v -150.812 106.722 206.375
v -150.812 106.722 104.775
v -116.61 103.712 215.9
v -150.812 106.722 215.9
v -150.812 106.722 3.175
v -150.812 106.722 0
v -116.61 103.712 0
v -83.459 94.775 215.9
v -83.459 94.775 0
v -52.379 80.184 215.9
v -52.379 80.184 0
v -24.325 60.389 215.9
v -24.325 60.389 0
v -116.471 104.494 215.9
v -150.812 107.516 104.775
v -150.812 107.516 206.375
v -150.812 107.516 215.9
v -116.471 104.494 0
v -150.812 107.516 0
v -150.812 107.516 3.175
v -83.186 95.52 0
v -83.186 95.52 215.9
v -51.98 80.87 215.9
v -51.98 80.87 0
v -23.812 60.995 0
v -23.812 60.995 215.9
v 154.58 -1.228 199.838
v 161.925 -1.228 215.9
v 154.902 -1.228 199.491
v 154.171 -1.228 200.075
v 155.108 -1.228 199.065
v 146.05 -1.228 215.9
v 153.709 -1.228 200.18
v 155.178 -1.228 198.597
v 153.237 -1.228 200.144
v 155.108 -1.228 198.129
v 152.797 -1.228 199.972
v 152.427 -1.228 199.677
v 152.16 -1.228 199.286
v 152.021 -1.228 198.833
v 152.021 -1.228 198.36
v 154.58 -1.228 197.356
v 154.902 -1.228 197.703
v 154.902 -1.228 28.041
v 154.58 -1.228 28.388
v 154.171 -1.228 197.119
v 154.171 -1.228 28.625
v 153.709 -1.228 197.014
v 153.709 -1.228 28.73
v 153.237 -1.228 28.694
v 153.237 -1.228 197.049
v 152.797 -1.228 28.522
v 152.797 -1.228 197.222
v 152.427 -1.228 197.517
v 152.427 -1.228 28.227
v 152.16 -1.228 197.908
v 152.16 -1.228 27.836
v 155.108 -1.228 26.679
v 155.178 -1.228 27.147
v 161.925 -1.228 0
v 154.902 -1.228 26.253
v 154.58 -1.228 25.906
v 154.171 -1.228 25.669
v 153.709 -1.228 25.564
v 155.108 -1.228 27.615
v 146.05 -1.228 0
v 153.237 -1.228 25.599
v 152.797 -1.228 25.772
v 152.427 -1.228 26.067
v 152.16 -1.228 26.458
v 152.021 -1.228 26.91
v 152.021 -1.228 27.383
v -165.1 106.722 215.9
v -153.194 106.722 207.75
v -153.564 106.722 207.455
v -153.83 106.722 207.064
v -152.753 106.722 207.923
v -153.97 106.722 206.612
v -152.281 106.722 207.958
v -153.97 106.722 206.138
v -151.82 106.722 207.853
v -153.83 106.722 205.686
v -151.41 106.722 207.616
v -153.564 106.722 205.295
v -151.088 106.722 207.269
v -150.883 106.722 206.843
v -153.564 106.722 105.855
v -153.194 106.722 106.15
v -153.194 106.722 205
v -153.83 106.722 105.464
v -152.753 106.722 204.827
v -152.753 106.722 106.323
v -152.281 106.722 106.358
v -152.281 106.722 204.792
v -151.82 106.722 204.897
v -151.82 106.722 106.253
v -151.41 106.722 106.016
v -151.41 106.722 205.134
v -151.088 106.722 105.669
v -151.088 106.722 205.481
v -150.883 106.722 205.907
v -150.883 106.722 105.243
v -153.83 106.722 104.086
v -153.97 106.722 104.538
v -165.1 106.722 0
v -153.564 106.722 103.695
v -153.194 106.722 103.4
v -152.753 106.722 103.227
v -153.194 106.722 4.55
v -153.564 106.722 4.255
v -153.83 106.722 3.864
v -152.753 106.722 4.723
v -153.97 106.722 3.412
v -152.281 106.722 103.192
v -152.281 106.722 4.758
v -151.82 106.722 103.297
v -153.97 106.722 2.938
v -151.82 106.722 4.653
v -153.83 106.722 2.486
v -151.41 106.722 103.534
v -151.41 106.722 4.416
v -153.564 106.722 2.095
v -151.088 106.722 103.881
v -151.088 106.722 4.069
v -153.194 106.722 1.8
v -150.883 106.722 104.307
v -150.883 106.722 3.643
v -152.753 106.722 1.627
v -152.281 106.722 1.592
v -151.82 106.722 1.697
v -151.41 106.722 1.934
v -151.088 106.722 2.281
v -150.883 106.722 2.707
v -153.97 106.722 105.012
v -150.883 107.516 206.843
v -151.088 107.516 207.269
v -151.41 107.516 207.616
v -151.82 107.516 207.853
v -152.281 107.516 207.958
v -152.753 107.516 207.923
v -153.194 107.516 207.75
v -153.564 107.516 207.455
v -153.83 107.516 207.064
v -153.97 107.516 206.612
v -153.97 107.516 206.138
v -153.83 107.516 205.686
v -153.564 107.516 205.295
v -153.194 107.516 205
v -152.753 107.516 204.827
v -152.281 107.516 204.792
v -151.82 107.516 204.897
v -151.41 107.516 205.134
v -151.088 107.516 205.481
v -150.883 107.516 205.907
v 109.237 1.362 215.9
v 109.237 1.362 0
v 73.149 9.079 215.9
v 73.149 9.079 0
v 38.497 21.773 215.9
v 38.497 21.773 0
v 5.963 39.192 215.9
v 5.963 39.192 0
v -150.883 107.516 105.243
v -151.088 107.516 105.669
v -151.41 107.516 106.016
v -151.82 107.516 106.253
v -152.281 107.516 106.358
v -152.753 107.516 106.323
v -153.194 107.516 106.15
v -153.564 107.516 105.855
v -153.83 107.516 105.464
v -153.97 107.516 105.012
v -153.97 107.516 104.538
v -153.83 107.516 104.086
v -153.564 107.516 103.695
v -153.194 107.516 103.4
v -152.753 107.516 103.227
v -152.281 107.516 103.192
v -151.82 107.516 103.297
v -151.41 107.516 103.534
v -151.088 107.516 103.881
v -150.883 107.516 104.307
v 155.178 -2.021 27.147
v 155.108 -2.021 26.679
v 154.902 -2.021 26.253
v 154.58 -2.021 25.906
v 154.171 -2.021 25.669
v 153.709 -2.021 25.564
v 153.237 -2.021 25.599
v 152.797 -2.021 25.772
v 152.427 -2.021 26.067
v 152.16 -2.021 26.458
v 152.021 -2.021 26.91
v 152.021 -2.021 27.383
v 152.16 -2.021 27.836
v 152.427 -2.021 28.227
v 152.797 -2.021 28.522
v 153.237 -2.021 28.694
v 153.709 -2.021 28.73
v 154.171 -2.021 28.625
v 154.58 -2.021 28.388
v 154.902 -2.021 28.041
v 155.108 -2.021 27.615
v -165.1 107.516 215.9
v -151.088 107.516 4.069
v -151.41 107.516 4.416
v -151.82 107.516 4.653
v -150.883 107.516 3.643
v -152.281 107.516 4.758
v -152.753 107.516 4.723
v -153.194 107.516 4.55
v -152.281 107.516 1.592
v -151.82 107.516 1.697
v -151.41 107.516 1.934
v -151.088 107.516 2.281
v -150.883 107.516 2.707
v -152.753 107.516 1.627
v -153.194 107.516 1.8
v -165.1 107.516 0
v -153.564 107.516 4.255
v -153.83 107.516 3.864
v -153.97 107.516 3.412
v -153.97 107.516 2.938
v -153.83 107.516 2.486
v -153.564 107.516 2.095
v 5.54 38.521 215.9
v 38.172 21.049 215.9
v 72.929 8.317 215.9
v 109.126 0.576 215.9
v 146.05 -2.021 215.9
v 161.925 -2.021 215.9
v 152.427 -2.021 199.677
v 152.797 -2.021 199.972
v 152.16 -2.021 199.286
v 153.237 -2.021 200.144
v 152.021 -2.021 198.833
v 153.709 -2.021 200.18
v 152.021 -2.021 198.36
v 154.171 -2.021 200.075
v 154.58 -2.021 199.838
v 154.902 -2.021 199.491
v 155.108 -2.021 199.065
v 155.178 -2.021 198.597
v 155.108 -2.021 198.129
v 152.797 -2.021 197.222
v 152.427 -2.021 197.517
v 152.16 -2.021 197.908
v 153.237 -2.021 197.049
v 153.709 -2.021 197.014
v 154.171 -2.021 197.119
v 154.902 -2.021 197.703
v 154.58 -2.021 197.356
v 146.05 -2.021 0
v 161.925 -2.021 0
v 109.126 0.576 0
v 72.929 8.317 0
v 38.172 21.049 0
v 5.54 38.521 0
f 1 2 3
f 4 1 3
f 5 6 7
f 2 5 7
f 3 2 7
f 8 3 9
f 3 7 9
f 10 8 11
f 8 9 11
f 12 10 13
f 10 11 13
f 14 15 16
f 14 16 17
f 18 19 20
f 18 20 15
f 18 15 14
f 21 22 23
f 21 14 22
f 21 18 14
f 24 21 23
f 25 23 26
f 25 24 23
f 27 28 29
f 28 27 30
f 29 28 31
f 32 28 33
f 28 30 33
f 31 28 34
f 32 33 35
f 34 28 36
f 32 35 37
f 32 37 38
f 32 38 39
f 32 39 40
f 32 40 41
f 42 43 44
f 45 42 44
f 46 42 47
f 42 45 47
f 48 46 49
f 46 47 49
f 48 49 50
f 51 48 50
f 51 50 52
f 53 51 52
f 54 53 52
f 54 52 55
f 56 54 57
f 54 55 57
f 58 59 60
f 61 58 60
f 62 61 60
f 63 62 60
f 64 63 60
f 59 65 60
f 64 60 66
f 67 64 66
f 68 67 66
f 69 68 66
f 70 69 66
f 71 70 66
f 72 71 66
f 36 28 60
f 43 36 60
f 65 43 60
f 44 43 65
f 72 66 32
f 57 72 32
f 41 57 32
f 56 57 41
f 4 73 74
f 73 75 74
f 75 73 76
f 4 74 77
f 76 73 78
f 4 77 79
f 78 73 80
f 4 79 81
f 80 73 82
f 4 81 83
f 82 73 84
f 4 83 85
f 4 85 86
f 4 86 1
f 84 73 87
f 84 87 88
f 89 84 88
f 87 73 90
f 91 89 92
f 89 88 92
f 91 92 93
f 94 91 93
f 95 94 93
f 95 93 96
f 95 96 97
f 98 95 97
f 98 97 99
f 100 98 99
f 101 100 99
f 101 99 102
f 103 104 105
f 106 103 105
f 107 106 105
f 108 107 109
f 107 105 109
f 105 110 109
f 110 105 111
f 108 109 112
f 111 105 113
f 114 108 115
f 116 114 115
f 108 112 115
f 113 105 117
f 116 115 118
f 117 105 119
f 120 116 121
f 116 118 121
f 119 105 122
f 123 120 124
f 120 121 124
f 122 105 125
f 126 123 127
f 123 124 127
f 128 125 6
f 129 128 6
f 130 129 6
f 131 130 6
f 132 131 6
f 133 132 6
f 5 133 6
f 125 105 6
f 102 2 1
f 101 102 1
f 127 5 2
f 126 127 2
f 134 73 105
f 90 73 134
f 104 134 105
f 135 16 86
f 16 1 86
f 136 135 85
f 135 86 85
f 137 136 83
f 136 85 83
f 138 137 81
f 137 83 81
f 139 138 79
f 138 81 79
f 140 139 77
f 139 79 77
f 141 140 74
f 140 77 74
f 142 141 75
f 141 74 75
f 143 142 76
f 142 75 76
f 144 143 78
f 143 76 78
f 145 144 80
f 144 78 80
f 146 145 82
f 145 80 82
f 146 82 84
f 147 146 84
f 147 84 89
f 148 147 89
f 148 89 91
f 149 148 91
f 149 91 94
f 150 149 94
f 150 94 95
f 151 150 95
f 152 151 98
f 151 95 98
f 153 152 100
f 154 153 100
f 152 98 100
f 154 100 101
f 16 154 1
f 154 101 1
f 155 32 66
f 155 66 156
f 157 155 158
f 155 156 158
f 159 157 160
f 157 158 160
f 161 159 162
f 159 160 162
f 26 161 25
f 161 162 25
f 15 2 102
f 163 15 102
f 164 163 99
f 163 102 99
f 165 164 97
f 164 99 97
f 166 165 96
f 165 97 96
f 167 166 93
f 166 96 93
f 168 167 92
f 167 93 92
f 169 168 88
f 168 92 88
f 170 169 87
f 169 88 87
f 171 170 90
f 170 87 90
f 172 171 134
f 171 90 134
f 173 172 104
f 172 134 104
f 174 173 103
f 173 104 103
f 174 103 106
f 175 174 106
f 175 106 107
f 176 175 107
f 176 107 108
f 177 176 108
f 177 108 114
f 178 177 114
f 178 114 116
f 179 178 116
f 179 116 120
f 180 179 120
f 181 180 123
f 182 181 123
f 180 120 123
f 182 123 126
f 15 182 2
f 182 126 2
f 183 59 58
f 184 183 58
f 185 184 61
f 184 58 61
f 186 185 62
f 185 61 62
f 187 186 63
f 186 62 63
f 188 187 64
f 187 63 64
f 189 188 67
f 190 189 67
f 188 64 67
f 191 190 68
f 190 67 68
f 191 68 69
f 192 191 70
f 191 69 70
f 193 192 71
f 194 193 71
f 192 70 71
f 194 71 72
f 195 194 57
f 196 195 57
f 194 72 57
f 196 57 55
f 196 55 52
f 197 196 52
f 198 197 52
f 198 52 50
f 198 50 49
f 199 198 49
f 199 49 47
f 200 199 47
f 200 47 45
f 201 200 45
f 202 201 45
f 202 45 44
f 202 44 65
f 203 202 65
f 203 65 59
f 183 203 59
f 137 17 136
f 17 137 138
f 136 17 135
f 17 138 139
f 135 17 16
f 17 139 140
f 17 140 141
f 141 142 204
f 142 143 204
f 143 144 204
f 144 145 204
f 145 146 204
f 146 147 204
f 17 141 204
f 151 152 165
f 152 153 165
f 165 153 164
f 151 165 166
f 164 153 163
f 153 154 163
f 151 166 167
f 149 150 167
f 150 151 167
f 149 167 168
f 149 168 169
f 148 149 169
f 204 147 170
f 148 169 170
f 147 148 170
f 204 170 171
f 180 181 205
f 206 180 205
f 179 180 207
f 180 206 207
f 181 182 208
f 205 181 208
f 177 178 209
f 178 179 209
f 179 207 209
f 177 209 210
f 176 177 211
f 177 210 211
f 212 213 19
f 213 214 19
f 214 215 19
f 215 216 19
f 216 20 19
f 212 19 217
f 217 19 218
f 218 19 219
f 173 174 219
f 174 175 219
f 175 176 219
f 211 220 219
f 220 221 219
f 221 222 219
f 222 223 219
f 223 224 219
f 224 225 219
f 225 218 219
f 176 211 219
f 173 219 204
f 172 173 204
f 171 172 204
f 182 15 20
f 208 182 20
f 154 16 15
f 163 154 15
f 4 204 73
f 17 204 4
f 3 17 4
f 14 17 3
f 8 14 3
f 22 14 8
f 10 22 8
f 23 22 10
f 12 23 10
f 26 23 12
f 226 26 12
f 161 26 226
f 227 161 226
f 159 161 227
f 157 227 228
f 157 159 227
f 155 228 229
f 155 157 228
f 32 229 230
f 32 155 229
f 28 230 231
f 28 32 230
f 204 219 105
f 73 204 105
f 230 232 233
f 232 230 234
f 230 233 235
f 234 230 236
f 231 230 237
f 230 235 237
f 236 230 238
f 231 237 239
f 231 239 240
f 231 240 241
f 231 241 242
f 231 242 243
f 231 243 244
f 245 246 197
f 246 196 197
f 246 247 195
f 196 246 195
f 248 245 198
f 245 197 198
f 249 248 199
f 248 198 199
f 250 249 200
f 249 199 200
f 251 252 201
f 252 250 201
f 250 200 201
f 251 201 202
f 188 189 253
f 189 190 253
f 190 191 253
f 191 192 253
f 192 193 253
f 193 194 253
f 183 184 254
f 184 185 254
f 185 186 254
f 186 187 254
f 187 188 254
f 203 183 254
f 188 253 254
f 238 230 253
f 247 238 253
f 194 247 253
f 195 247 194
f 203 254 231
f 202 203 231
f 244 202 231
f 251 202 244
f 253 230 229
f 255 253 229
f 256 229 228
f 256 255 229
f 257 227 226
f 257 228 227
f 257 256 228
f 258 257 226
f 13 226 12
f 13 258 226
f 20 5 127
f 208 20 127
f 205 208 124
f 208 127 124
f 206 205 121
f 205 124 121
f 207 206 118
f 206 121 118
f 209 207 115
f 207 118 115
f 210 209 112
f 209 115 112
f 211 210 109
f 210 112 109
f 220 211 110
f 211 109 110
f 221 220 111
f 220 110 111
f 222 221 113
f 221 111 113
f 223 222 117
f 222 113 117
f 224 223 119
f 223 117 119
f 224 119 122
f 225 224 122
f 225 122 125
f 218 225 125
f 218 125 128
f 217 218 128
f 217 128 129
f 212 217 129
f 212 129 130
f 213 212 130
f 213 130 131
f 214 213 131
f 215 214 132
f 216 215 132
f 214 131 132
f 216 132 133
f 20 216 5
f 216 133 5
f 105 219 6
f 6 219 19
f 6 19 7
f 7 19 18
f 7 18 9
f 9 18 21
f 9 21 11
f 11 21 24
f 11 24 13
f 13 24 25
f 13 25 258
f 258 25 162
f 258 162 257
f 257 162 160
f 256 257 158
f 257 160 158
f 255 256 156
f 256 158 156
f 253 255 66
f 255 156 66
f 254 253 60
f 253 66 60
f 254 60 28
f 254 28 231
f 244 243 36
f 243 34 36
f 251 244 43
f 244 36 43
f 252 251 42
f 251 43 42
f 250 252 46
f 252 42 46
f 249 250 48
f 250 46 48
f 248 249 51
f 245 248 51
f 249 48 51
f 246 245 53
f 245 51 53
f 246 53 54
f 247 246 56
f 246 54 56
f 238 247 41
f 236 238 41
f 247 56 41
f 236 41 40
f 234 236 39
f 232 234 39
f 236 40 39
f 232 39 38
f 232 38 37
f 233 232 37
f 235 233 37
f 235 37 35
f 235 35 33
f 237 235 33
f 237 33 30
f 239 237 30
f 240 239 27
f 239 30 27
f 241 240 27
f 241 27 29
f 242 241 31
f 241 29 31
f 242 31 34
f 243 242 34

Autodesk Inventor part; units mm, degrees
ref_plane "YZ Plane" through (0, 0, 0) normal (1, 0, 0) x (0, 1, 0)
ref_plane "XZ Plane" through (0, 0, 0) normal (0, 1, 0) x (-1, 0, 0)
ref_plane "Work Plane1" through (0, 0, 0) normal (0, 0, 1) x (1, 0, 0)
sketch "Sketch1" plane through (0, 0, 0) normal (0, 0, 1) x (1, 0, 0)
  line L0 (165.1, 107.5162) -> (-165.1, 107.5162) construction
  line L1 (-165.1, 107.5162) -> (-165.1, 110.6912) construction
  line L2 (165.1, 110.6912) -> (-165.1, 110.6912) construction
  line L3 (165.1, 107.5162) -> (165.1, 110.6912) construction
  line L4 (161.925, -1.2275) -> (161.925, 14.6475) construction
  line L5 (161.925, 14.6475) -> (161.1313, 14.6475) construction
  line L6 (161.1313, 14.6475) -> (161.1313, -0.4338) construction
  line L7 (161.1313, -0.4338) -> (146.05, -0.4338) construction
  line L8 (146.05, -0.4338) -> (146.05, -1.2275) construction
  line L9 (146.05, -1.2275) -> (161.925, -1.2275) construction
  line L10 (-153.9875, 110.6912) -> (-150.8125, 110.6912) construction
  line L11 (161.925, -1.2275) -> (146.05, -1.2275)
  arc A0 (-23.8125, 60.9948) -> (-150.8125, 107.5162) centre (-150.8125, -89.0948) ccw
  arc A1 (-23.8125, 60.9948) -> (146.05, -1.2275) centre (146.05, 261.7398) ccw
  line L12 (-150.8125, 110.6912) -> (-150.8125, 107.5162) construction
  line L13 (-150.8125, 107.5162) -> (-165.1, 107.5162)
  arc A2 (-24.3252, 60.3889) -> (-150.8125, 106.7225) centre (-150.8125, -89.0948) ccw
  arc A3 (-24.3252, 60.3889) -> (146.05, -2.0213) centre (146.05, 261.7398) ccw
  line L14 (146.05, -2.0213) -> (161.925, -2.0213)
  line L15 (-165.1, 107.5162) -> (-165.1, 106.7225)
  line L16 (-165.1, 106.7225) -> (-150.8125, 106.7225)
  line L17 (161.925, -1.2275) -> (161.925, -2.0213)
  point P0 (0, 0)
  dimension "d8" = 127
  dimension "d9" = 0.7937
extrude "Extrusion1" add sketch "Sketch1" along normal blind 215.9
sketch "Sketch2" plane through (-165.1, 106.7225, 0) normal (0, -1, 0) x (1, 0, 0)
  circle A0 centre (12.7, 3.175) radius 1.5875
  circle A1 centre (12.7, 104.775) radius 1.5875
  circle A2 centre (12.7, 206.375) radius 1.5875
  line L0 (14.2875, 0) -> (0, 0) projected
  line L1 (14.2875, 0) -> (14.2875, 215.9) projected
  line L2 (0, 215.9) -> (14.2875, 215.9) projected
  line L3 (0, 0) -> (0, 215.9) projected
  point P0 (165.1, 0)
extrude "Extrusion2" cut sketch "Sketch2" against normal through all contours A0 | A1 | A2
sketch "Sketch3" plane through (146.05, -1.2275, 0) normal (0, 1, 0) x (1, 0, 0)
  circle A0 centre (7.5406, -198.5968) radius 1.5875 projected
  circle A1 centre (7.5406, -27.1468) radius 1.5875 projected
  point P0 (-146.05, 0)
extrude "Extrusion3" cut sketch "Sketch3" against normal through all
properties part number "Bounce Polycarbonate Flap" material "Polycarbonate, Clear"
